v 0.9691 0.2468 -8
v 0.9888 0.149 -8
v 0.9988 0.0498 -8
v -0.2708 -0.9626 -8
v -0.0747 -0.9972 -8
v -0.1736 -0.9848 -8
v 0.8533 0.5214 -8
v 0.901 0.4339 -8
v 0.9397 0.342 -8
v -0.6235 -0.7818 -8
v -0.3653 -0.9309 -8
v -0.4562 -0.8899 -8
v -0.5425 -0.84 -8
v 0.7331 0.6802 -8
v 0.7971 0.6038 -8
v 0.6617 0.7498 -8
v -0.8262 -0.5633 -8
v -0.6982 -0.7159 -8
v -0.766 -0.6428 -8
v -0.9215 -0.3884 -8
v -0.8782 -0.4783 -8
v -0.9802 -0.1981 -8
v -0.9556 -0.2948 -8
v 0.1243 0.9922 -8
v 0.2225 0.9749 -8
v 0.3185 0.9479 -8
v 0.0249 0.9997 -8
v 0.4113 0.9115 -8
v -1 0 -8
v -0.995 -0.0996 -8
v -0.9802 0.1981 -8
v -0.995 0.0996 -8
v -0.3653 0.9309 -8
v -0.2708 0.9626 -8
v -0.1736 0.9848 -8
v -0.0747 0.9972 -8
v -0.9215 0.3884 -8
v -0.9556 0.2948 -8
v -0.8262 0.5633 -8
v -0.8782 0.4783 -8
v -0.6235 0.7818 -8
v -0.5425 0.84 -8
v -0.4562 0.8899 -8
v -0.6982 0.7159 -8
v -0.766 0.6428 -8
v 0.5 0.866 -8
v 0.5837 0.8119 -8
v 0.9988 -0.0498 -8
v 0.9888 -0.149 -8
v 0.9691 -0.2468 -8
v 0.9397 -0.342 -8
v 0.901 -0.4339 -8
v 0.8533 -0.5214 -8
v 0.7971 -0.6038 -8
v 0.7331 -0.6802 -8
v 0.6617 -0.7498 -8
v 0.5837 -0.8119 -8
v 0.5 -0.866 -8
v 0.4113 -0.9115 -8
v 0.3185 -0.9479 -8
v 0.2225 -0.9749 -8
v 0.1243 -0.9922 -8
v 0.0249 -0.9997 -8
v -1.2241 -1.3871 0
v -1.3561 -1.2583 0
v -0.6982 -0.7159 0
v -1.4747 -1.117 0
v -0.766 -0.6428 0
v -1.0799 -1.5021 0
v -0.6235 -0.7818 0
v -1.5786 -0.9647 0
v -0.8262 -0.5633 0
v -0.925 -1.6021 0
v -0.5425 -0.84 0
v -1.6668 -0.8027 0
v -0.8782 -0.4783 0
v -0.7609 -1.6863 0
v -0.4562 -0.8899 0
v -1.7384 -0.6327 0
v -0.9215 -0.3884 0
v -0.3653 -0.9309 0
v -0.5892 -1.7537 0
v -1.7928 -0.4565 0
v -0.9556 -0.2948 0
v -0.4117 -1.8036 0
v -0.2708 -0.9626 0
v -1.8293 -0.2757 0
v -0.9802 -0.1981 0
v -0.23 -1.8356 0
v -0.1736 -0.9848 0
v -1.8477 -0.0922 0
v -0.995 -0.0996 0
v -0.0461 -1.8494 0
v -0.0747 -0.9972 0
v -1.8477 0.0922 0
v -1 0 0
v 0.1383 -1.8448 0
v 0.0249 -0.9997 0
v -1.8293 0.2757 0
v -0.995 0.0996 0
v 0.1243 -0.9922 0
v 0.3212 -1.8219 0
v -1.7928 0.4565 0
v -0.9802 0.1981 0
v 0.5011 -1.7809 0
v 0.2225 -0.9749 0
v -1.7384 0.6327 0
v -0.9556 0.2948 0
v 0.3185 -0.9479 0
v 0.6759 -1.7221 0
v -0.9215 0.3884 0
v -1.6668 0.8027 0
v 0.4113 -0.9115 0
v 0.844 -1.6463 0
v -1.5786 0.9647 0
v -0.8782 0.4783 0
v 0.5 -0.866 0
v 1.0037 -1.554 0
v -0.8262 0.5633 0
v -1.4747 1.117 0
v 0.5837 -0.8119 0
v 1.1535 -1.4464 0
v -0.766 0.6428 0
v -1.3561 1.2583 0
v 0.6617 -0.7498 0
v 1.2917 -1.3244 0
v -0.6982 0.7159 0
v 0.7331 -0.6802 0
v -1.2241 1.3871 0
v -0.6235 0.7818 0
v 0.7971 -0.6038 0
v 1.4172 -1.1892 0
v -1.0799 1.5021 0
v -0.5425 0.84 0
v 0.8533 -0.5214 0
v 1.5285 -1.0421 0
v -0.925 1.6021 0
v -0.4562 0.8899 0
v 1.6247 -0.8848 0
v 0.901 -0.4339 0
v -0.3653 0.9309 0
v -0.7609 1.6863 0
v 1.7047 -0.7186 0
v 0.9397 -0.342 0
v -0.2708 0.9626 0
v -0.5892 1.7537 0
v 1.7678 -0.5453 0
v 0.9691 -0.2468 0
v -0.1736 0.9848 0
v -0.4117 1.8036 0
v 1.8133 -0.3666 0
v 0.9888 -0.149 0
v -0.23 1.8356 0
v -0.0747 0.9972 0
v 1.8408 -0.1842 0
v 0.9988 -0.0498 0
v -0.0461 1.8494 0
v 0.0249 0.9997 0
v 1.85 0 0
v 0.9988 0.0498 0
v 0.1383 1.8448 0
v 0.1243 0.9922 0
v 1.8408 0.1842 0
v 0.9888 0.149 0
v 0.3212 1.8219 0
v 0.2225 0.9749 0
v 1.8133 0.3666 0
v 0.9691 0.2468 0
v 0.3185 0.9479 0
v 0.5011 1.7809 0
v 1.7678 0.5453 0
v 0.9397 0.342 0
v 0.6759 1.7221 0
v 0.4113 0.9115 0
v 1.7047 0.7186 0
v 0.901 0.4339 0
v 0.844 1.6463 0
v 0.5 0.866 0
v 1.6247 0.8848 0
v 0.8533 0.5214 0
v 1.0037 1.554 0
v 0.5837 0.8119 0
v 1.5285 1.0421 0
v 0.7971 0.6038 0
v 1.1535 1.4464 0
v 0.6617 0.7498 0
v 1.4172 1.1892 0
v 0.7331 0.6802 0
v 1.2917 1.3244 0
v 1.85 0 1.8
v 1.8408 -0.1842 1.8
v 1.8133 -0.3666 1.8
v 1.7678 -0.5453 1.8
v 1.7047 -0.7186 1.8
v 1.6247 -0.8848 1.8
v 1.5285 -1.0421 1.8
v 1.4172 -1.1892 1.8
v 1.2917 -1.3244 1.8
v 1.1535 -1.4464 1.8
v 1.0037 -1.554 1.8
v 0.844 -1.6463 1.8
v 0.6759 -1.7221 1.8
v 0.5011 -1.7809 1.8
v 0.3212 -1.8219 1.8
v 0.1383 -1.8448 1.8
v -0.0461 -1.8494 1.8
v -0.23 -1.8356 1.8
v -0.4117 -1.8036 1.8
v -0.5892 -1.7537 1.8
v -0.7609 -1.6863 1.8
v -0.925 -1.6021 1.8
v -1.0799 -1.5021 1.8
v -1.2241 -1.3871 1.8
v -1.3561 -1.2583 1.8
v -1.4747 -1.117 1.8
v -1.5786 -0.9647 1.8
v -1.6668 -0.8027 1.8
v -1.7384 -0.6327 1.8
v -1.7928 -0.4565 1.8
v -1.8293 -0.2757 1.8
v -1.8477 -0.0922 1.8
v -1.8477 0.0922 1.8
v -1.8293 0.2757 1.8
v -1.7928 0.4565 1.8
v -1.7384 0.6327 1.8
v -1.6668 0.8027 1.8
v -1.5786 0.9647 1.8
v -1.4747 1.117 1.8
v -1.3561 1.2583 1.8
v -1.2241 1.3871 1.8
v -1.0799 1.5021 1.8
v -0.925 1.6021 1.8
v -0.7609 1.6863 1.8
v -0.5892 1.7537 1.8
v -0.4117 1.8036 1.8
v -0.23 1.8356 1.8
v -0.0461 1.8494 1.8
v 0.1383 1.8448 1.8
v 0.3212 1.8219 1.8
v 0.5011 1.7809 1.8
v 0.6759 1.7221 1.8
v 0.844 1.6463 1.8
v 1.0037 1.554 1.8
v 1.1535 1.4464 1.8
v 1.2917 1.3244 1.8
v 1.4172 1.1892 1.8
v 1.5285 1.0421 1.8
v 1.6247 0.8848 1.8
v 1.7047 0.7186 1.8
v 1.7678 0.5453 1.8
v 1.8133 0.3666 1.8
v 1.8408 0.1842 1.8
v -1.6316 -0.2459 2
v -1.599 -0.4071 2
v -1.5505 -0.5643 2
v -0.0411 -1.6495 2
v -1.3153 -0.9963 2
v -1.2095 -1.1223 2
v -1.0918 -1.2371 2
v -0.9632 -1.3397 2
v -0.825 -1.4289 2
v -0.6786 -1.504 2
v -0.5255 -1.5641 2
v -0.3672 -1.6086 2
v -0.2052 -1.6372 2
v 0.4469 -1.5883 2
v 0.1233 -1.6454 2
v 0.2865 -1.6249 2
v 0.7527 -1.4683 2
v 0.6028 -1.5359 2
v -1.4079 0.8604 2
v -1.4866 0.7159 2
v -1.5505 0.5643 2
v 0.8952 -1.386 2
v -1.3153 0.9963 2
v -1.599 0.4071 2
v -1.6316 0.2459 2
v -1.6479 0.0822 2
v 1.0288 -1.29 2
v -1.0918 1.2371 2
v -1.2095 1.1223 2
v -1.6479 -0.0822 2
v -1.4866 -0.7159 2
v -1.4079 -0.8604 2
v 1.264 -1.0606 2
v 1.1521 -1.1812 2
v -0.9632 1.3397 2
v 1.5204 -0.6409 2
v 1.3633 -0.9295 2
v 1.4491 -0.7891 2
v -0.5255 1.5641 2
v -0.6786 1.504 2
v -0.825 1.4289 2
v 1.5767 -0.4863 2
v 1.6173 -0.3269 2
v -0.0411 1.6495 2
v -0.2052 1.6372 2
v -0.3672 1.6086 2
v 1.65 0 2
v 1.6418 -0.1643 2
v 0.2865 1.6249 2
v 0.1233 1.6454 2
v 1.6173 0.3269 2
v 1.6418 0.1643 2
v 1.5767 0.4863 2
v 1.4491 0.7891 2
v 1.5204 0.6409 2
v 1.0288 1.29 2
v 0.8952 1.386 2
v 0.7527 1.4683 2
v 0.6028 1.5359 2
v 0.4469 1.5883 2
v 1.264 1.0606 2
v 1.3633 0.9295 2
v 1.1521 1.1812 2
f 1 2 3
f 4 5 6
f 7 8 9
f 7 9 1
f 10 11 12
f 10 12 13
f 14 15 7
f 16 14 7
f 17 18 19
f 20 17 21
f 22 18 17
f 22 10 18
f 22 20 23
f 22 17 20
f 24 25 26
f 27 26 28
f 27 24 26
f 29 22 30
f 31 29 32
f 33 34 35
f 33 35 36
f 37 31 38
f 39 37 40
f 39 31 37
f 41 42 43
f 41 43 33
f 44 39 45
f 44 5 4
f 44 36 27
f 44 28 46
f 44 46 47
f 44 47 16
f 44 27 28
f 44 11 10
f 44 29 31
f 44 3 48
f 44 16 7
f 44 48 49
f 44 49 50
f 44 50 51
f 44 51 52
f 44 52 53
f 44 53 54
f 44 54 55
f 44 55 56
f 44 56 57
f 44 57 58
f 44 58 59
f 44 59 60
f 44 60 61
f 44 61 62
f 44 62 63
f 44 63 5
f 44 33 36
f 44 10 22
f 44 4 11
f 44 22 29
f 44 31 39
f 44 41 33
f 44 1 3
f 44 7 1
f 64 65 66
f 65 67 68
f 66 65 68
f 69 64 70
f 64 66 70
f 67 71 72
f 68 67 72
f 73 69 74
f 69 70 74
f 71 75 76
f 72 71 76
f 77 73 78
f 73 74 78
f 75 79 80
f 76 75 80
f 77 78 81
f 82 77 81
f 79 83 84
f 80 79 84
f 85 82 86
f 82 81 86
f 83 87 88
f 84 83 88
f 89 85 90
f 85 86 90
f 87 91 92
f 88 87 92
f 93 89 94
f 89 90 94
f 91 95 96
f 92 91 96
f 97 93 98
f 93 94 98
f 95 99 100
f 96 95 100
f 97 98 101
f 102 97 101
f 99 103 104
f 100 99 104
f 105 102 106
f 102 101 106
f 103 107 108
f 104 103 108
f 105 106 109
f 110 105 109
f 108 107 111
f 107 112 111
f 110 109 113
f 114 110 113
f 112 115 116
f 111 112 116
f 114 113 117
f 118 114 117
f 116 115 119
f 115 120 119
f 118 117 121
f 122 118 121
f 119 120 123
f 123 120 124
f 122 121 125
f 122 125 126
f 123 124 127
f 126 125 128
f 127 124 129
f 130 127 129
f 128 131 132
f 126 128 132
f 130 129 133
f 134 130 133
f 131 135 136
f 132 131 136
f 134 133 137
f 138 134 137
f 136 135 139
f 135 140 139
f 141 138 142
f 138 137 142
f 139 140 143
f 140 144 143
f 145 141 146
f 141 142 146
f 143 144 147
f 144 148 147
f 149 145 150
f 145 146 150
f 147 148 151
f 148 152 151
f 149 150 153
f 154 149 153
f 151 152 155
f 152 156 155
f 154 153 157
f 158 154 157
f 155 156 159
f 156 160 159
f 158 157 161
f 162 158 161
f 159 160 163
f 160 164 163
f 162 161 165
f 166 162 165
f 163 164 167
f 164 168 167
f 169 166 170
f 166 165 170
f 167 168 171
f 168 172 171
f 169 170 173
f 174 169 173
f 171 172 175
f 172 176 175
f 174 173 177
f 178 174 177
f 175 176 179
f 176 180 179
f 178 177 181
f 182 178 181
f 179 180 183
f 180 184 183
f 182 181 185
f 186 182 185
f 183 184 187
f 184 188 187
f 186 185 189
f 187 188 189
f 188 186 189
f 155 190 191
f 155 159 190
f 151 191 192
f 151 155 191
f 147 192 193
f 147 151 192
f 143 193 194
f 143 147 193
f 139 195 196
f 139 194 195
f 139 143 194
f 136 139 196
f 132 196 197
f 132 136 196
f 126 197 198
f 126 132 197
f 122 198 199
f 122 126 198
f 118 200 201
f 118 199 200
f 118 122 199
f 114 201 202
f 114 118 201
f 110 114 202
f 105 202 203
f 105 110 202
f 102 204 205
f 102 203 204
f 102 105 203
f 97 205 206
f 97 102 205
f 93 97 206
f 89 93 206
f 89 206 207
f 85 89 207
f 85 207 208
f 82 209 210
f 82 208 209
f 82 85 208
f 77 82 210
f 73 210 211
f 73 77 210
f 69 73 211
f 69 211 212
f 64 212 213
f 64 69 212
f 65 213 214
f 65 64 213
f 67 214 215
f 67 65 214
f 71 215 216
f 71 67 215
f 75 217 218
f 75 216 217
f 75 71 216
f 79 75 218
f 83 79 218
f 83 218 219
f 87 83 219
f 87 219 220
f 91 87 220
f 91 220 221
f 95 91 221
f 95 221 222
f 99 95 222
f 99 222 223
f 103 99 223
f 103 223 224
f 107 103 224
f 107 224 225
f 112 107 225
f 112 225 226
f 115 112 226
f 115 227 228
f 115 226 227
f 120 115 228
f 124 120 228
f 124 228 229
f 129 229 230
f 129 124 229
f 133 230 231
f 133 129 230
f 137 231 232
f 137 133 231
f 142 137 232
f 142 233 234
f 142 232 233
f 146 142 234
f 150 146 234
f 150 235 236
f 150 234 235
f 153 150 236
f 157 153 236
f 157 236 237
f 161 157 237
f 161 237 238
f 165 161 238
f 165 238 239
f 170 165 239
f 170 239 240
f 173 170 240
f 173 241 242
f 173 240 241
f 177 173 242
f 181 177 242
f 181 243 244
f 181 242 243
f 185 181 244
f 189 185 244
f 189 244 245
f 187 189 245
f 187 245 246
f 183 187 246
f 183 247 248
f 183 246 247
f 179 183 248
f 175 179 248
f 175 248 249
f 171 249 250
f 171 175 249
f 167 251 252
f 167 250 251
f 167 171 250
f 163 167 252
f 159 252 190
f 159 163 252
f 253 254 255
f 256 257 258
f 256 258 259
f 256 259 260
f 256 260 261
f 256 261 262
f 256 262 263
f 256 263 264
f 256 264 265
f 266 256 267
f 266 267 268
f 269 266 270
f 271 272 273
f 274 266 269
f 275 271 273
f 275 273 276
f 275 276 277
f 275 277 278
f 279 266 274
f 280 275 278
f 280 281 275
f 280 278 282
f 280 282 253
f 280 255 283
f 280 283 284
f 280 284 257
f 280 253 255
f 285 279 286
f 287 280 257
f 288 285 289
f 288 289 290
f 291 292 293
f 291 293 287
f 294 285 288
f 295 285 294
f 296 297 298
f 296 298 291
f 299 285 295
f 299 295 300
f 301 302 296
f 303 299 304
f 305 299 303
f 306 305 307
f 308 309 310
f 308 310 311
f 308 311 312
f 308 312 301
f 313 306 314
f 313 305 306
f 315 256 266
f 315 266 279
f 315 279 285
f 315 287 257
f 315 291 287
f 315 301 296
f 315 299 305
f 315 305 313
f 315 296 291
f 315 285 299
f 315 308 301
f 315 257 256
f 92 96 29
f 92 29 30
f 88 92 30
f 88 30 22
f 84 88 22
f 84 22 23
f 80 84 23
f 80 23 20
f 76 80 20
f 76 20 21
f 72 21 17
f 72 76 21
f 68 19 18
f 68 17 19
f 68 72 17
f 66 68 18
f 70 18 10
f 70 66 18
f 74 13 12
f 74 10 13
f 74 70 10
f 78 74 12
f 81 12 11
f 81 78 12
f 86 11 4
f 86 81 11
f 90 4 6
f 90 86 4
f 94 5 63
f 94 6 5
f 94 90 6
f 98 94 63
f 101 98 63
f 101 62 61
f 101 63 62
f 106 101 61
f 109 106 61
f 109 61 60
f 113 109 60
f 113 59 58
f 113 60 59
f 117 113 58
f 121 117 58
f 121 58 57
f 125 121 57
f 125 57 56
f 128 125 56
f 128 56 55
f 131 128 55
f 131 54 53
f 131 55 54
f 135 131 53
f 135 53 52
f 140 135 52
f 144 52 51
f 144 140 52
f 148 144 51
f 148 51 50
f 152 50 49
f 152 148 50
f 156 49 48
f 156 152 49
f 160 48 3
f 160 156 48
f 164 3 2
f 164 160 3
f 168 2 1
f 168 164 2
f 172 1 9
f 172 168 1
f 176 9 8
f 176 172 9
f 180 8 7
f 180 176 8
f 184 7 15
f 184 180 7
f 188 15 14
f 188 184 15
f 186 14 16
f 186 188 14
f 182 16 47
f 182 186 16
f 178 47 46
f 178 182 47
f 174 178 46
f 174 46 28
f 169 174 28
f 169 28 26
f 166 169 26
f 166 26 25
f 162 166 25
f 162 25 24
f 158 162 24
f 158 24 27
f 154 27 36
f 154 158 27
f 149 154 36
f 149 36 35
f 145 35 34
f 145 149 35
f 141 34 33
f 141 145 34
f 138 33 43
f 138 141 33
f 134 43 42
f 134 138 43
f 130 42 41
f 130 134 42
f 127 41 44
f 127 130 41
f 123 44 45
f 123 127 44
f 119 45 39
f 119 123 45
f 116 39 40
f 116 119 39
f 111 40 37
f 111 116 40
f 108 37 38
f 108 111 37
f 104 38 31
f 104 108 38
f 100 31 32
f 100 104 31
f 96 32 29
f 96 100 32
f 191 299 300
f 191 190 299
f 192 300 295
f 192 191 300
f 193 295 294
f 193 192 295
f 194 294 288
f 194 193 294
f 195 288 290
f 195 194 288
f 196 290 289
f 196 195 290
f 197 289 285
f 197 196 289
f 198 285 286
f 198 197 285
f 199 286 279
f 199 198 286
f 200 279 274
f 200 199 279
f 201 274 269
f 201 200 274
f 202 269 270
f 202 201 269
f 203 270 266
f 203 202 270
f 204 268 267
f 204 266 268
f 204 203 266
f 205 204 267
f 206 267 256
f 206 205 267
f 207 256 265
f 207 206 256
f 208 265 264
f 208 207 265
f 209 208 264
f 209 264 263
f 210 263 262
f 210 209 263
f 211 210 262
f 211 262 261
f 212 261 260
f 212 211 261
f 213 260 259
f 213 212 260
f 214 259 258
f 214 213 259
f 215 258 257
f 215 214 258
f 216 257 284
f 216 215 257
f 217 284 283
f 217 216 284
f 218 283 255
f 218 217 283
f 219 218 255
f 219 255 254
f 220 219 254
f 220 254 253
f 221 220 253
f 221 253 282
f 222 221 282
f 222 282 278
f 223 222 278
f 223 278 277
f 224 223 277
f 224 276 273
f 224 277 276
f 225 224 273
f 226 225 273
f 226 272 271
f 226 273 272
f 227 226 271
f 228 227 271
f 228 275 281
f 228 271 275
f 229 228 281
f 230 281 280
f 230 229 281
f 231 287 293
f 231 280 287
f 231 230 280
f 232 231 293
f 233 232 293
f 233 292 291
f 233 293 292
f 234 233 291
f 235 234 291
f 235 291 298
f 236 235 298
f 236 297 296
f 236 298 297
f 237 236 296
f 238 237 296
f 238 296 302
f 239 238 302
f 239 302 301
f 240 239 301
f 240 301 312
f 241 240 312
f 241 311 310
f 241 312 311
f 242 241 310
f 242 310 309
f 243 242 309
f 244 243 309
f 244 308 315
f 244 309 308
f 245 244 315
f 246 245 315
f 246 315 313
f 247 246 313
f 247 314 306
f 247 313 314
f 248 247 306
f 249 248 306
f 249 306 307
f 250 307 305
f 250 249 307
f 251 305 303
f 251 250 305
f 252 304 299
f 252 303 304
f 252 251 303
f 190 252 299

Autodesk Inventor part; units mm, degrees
ref_plane "YZ Plane" through (0, 0, 0) normal (1, 0, 0) x (0, 1, 0)
ref_plane "XZ Plane" through (0, 0, 0) normal (0, 1, 0) x (-1, 0, 0)
ref_plane "XY Plane" through (0, 0, 0) normal (0, 0, 1) x (1, 0, 0)
sketch "スケッチ1" plane through (0, 0, 0) normal (0, 0, 1) x (1, 0, 0)
  circle A0 centre (0, 0) radius 1.85
  dimension "d0" = 3.7
extrude "押し出し1" add sketch "スケッチ1" along normal blind 2
sketch "スケッチ2" plane through (0, 0, 0) normal (0, 0, -1) x (-1, 0, 0)
  circle A0 centre (0, 0) radius 1
  dimension "d3" = 2
extrude "押し出し2" add sketch "スケッチ2" along normal blind 8
thread "ねじ1" size "M2x0.4" class "6g" standard "ANSI Metric M Profile" full length
chamfer "面取り1" distance 0.2 angle 45 1 edges at (-1.85, 0, 2)
properties part number "M2×8" material "ステンレス鋼"
